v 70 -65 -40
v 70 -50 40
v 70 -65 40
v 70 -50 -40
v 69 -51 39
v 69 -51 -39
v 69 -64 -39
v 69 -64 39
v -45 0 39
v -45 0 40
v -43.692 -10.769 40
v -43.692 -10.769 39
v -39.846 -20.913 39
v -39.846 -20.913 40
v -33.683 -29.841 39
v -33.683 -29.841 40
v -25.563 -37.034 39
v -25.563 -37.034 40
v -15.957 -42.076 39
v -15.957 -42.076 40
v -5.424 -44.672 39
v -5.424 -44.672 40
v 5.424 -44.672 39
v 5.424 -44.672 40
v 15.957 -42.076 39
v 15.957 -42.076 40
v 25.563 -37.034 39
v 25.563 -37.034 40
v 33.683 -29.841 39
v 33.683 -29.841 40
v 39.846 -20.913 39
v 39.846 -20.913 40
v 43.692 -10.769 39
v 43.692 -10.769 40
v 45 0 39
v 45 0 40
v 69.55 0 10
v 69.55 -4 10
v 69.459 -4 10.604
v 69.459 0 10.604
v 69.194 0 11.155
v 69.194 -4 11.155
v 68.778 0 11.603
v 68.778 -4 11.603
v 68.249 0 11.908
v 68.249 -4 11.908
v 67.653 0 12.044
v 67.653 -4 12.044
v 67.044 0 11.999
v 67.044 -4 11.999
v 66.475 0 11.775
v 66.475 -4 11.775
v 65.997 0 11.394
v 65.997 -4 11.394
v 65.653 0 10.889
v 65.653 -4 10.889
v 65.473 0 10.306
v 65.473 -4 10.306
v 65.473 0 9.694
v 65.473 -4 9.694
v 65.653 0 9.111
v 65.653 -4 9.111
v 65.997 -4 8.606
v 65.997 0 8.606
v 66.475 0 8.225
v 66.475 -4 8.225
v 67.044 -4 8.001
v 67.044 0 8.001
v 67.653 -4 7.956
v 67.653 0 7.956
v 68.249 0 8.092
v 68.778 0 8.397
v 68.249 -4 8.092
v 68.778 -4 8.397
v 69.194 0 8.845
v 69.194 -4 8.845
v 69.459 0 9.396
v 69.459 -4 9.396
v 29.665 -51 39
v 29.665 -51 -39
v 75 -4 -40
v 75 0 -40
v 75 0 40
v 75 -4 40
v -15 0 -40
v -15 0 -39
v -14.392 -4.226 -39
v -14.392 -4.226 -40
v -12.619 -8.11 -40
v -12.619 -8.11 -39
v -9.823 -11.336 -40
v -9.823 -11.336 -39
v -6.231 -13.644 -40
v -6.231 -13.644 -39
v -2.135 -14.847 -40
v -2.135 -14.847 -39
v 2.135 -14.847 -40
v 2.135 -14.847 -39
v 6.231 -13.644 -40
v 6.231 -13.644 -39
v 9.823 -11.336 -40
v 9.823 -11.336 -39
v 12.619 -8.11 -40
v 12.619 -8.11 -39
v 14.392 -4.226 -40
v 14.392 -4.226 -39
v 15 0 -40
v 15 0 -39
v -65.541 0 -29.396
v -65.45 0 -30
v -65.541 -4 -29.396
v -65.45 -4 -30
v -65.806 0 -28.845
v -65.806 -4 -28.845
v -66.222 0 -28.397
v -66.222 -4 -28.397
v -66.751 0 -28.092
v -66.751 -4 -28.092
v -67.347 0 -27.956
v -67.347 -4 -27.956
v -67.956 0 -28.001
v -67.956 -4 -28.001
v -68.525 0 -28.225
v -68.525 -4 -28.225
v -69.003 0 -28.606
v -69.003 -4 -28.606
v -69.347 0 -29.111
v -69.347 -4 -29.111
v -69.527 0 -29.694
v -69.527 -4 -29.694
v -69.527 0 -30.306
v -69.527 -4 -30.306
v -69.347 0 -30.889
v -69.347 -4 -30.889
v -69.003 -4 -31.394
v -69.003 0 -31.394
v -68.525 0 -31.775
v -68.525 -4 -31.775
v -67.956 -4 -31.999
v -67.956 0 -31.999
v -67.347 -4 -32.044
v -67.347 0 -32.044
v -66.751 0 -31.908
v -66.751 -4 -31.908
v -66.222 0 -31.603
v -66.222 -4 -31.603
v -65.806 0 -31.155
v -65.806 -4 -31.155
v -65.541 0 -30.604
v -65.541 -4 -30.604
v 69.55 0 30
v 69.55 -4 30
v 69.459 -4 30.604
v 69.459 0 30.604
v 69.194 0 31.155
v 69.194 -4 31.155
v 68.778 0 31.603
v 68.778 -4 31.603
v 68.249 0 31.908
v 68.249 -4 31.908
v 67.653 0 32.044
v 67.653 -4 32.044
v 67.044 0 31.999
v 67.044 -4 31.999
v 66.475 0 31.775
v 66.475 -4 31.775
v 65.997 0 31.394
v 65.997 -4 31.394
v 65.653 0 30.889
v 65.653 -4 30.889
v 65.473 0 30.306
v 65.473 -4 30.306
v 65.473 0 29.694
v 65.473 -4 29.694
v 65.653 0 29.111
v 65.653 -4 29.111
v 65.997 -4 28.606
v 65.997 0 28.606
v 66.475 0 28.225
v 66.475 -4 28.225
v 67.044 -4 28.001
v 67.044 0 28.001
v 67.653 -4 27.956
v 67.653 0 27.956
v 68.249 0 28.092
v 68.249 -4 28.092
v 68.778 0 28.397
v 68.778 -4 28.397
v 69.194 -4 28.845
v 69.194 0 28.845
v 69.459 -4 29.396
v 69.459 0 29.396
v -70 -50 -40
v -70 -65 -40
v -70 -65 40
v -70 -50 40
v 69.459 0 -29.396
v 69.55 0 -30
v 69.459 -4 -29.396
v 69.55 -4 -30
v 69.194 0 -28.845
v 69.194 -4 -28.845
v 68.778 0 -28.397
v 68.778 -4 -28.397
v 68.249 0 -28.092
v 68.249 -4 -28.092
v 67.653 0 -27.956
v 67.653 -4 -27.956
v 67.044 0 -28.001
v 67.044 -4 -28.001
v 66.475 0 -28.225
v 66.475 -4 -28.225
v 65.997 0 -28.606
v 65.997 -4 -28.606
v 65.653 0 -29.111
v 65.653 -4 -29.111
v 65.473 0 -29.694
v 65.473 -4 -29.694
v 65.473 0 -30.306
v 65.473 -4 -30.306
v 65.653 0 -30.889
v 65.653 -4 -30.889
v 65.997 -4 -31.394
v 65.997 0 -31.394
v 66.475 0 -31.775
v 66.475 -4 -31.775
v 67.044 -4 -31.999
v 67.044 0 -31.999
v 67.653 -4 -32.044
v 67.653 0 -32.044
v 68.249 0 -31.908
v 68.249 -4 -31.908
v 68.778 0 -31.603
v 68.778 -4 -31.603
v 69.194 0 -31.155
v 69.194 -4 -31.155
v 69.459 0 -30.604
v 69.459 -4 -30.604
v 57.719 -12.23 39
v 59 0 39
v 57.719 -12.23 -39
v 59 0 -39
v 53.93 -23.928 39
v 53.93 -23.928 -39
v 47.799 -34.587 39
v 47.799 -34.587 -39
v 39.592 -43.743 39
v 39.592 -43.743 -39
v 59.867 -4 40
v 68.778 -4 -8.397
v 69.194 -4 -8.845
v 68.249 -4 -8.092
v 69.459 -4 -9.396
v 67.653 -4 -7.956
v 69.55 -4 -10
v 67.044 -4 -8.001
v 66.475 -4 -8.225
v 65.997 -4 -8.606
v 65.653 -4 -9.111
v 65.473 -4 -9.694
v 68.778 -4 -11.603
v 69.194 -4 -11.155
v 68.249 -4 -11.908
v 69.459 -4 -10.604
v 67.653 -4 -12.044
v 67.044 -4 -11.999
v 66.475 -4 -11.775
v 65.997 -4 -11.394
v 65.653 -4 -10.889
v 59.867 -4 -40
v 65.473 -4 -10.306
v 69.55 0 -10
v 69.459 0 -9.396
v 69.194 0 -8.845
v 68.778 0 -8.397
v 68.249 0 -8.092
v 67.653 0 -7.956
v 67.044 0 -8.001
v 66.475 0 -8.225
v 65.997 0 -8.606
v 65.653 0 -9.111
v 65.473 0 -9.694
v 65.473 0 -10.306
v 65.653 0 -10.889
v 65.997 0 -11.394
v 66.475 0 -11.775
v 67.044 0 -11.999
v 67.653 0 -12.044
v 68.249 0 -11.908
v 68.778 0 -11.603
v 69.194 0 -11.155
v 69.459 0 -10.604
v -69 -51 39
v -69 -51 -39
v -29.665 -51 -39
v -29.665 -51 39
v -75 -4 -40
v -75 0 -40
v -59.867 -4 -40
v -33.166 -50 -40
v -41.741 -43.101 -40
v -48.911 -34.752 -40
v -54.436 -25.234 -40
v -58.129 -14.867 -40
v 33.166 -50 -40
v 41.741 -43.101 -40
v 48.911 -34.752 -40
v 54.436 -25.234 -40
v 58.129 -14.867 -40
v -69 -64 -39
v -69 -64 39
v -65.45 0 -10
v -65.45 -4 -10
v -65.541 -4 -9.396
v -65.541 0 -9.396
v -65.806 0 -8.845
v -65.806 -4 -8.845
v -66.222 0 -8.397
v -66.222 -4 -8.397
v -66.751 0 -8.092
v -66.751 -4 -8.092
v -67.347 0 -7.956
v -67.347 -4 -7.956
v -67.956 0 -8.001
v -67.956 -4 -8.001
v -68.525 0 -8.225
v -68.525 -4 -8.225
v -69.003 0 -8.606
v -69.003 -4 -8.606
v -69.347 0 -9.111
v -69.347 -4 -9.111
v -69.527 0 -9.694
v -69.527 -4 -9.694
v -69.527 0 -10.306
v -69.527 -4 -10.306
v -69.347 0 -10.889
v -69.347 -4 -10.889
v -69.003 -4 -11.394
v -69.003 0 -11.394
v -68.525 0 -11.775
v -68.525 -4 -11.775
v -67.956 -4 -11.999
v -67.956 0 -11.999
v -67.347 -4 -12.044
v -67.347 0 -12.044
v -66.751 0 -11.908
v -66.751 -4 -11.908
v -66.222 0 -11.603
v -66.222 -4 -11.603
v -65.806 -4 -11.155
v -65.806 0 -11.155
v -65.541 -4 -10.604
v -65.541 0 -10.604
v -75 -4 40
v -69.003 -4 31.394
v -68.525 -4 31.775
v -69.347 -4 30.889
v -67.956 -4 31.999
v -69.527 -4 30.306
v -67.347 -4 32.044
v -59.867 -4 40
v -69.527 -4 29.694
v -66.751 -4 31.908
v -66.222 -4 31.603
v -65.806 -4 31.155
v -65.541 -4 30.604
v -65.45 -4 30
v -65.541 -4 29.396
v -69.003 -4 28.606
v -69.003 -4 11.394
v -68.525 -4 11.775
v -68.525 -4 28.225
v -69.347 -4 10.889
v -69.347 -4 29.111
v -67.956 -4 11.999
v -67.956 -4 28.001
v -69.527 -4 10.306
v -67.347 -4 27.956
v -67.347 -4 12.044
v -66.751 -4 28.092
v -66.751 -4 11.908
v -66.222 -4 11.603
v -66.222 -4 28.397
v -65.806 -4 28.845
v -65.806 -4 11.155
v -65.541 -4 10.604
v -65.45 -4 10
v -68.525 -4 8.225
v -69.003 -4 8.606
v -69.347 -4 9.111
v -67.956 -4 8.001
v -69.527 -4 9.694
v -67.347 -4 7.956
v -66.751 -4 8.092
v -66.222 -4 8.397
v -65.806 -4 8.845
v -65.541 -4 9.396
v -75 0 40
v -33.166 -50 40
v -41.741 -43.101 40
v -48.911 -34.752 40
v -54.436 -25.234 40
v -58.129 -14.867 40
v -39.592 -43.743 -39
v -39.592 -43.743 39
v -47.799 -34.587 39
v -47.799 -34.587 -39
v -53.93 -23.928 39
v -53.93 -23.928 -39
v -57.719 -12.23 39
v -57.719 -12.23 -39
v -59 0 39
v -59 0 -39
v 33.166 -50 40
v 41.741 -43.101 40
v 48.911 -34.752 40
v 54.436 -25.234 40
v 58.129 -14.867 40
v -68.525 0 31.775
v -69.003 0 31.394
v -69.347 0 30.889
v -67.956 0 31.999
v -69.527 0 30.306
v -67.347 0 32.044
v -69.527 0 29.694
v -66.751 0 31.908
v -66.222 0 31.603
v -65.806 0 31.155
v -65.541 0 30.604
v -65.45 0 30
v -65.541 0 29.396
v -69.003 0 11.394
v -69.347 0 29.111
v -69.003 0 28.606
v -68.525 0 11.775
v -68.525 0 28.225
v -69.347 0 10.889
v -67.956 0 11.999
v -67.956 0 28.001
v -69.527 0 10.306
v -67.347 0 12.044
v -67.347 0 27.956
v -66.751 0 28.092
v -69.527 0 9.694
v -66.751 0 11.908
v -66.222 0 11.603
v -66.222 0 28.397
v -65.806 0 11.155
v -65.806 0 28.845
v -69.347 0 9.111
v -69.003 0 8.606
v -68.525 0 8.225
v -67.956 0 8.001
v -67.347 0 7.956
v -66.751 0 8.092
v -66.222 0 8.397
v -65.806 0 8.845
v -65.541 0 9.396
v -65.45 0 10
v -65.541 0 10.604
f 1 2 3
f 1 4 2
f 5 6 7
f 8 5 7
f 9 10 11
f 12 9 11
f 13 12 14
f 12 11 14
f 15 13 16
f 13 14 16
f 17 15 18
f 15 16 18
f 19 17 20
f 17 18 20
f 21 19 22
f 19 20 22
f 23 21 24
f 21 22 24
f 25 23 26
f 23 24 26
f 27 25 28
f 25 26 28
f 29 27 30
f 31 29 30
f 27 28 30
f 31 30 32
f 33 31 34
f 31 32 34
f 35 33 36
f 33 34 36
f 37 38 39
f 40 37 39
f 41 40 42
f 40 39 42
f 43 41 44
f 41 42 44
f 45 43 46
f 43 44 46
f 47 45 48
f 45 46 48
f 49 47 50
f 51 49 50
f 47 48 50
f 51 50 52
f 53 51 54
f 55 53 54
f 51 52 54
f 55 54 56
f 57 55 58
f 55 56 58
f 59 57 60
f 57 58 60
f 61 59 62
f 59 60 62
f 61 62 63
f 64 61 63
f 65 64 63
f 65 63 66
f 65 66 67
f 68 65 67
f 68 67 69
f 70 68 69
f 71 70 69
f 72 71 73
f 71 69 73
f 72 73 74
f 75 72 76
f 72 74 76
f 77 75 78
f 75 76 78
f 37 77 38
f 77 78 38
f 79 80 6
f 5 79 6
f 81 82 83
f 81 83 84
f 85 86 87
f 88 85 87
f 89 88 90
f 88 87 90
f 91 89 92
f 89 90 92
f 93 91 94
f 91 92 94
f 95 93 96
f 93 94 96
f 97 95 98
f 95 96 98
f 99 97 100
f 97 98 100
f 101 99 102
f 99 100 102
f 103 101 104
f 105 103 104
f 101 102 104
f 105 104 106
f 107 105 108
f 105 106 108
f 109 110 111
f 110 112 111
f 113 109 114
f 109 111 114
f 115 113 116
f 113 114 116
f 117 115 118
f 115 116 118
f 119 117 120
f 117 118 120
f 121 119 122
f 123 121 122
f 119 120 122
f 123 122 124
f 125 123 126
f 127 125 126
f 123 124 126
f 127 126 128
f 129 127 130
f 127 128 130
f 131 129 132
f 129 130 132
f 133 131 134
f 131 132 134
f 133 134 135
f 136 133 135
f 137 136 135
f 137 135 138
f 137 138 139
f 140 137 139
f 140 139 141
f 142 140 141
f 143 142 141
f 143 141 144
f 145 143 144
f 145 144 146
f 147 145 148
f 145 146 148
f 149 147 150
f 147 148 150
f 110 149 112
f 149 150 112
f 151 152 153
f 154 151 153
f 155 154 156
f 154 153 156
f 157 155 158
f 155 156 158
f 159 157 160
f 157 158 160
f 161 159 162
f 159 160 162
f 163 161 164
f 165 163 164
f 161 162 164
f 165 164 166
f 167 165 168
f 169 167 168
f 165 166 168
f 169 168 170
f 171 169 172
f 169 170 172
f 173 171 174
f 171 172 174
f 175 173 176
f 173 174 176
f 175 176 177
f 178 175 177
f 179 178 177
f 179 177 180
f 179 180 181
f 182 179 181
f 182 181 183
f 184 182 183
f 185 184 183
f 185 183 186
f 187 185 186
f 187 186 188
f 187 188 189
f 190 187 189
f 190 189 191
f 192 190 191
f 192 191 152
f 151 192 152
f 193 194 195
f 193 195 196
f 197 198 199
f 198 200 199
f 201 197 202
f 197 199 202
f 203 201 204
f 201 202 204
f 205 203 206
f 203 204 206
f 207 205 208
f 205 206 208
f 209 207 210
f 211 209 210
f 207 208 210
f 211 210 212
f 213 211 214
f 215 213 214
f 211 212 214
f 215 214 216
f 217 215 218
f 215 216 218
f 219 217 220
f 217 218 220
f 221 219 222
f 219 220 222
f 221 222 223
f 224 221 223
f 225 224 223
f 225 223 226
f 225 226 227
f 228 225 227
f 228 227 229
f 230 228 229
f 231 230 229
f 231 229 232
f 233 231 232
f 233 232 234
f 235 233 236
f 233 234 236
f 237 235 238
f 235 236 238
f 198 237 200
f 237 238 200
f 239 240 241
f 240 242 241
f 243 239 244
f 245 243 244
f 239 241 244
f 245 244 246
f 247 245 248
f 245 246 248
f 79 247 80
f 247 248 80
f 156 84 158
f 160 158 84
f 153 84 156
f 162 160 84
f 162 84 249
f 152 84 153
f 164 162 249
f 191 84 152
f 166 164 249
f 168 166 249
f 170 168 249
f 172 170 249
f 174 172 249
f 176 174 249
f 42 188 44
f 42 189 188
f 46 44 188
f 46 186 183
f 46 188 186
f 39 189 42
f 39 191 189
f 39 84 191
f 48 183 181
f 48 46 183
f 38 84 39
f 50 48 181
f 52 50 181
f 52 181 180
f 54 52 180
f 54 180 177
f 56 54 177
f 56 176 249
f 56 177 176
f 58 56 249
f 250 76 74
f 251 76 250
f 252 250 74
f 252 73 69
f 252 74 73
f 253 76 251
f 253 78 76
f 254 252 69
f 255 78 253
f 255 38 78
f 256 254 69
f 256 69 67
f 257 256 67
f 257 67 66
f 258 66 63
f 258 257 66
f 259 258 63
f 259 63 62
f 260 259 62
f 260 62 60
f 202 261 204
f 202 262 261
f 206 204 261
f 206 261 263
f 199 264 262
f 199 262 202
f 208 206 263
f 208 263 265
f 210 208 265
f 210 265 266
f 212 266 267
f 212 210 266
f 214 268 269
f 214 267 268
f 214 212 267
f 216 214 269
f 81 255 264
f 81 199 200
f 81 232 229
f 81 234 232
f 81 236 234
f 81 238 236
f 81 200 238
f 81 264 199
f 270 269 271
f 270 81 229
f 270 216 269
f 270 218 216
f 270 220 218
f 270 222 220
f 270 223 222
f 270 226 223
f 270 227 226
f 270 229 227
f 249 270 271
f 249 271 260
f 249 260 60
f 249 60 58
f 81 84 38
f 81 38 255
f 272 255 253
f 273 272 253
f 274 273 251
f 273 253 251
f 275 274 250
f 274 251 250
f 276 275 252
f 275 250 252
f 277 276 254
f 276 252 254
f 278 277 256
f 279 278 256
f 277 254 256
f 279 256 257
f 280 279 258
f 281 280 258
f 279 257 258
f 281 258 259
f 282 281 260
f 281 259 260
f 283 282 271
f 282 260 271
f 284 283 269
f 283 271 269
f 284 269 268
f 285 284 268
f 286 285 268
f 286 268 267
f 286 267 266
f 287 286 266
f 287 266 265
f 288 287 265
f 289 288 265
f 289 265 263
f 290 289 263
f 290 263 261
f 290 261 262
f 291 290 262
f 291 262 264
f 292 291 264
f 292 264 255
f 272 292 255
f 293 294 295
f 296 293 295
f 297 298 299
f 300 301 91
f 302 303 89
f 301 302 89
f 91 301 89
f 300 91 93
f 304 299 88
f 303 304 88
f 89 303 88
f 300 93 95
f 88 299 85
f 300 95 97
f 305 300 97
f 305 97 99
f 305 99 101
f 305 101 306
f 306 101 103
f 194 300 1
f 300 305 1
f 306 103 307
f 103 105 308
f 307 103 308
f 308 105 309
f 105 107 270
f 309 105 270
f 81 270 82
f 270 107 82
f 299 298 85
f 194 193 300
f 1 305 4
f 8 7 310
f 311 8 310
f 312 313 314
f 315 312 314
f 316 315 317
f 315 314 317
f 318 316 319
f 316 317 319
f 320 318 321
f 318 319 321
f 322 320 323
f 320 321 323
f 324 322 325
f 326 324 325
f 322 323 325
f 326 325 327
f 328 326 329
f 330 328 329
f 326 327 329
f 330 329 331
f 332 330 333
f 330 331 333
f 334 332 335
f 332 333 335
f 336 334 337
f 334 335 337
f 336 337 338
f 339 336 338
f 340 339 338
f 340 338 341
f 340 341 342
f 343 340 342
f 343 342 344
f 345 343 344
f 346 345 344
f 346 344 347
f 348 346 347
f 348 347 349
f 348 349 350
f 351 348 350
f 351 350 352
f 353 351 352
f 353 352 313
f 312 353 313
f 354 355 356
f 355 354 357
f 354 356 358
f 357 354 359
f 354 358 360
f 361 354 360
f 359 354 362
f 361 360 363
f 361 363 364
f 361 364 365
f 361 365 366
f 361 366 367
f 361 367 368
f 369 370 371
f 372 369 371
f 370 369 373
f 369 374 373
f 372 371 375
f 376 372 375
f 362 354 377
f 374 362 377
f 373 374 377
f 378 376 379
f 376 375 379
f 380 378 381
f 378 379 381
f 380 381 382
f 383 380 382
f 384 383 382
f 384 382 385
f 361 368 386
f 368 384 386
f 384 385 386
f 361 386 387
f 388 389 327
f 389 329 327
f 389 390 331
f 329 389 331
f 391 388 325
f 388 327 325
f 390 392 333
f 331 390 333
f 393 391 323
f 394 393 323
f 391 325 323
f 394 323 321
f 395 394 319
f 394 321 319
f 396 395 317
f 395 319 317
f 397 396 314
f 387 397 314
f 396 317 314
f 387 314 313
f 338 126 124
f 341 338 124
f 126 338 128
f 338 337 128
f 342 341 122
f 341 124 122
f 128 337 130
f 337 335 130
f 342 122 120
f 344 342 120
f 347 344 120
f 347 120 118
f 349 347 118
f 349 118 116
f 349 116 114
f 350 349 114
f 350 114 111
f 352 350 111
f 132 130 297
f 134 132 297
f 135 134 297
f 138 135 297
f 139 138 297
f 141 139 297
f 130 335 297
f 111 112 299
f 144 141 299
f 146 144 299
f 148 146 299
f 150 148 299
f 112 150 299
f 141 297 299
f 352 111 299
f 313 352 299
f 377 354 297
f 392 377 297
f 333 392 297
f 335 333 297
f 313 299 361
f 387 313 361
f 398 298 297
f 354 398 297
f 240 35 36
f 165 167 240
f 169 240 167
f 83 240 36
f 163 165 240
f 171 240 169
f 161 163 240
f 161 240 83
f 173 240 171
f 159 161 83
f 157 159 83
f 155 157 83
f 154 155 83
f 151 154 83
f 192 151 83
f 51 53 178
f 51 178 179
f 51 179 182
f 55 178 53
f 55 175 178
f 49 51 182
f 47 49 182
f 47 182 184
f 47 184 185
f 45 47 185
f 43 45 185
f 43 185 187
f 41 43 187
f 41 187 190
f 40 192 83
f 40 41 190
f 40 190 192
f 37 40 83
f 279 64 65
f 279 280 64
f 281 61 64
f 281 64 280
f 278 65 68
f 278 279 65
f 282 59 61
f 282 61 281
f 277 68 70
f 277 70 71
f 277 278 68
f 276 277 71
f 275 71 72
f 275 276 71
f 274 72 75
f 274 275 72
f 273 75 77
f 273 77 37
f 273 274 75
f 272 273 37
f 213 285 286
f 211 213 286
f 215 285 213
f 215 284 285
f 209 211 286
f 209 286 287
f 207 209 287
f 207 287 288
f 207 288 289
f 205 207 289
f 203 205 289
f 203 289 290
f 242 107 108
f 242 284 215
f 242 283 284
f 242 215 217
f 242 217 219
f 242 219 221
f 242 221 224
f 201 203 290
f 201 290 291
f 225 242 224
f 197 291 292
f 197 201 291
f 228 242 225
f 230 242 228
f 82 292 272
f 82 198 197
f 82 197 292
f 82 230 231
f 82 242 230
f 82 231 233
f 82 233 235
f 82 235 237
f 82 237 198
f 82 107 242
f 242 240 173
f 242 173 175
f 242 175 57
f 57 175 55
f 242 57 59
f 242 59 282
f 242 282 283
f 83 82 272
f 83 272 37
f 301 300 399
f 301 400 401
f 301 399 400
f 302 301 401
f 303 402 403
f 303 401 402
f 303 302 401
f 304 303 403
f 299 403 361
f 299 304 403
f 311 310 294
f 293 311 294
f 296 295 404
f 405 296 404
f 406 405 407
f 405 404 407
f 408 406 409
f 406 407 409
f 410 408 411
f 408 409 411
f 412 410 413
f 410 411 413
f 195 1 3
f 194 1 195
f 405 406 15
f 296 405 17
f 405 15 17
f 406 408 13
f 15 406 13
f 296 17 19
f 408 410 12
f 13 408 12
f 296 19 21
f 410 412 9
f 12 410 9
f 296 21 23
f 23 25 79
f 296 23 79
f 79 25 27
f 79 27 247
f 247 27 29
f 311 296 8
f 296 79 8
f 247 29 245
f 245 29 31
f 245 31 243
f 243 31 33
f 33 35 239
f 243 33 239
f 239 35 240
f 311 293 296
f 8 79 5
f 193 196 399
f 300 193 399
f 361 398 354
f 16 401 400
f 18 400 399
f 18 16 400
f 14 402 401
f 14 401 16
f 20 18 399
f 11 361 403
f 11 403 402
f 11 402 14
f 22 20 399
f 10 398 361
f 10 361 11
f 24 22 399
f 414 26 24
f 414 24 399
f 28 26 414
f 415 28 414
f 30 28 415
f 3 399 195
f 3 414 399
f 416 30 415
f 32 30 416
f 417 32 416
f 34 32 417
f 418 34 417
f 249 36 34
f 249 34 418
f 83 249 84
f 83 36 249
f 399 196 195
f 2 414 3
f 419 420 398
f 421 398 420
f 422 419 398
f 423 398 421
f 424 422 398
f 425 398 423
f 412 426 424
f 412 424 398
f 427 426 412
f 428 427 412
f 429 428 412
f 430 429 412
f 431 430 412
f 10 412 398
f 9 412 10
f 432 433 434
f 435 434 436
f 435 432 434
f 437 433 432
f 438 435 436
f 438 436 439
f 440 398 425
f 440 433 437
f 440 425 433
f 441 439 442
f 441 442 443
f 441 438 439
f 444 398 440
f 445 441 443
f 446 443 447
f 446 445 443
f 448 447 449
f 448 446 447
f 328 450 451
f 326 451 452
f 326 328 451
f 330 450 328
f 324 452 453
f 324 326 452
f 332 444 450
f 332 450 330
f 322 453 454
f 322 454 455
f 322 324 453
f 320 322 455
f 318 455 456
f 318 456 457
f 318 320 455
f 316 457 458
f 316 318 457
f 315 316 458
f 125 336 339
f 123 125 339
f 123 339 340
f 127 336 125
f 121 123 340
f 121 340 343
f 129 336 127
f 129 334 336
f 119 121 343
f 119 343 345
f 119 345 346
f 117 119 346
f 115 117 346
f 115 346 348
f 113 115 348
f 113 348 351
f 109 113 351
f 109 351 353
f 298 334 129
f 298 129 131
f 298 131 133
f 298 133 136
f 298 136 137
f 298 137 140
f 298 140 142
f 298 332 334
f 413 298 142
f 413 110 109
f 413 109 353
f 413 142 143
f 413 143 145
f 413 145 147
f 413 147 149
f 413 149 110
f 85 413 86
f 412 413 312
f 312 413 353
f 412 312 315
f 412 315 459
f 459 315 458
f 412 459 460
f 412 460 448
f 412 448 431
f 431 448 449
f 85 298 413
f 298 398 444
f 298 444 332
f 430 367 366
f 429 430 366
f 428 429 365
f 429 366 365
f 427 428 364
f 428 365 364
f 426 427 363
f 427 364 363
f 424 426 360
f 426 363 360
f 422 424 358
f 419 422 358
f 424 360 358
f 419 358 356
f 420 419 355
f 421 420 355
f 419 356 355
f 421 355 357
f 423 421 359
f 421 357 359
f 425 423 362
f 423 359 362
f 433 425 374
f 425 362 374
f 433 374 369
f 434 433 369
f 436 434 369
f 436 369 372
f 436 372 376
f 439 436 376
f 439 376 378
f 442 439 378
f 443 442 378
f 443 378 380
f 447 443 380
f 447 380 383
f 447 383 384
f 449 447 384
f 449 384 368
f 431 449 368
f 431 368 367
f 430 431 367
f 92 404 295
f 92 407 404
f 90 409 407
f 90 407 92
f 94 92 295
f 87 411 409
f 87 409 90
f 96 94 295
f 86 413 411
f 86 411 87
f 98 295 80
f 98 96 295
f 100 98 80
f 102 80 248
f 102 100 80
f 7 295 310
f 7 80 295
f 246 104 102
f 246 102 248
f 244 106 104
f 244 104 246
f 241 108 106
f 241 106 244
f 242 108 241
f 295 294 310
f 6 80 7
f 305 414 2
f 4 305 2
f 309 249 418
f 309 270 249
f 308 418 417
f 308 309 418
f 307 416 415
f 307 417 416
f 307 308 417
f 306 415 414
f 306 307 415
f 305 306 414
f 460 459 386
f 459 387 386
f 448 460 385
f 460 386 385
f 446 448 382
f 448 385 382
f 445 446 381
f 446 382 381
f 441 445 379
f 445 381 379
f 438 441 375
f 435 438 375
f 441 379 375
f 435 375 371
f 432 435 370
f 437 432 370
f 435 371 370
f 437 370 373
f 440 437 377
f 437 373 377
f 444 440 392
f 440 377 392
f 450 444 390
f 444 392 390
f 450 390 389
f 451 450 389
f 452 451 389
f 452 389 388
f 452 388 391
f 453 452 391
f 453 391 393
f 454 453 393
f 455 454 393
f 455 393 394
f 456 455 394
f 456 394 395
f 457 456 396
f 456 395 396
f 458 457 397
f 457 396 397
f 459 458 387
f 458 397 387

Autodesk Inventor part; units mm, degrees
ref_plane "YZ Plane" through (0, 0, 0) normal (1, 0, 0) x (0, 1, 0)
ref_plane "XZ Plane" through (0, 0, 0) normal (0, 1, 0) x (-1, 0, 0)
ref_plane "XY Plane" through (0, 0, 0) normal (0, 0, 1) x (1, 0, 0)
sketch "Sketch1" plane through (0, 0, 0) normal (0, 0, 1) x (1, 0, 0)
  line L0 (-60, 0) -> (60, 0)
  line L1 (70, -50) -> (70, -65)
  line L2 (70, -65) -> (-70, -65)
  line L3 (-70, -65) -> (-70, -50)
  line L4 (-70, -50) -> (70, -65) construction
  line L5 (-70, -50) -> (-33.1662, -50)
  line L6 (33.1662, -50) -> (70, -50)
  arc A0 (-60, 0) -> (-33.1662, -50) centre (0, 0) ccw
  arc A1 (33.1662, -50) -> (60, 0) centre (0, 0) ccw
  line L7 (70, -50) -> (24.1881, -54.9084) construction
  line L8 (0, -57.5) -> (-70, -65) construction
  dimension "d1" = 15
  dimension "d2" = 140
  dimension "d3" = 0
  dimension "d4" = 65
extrude "Extrusion1" add sketch "Sketch1" along normal mid plane 80
shell "Shell1" thickness 1 removed faces 1 at (-20, 0, 13.3333)
sketch "Sketch2" plane through (0, 0, 40) normal (0, 0, 1) x (1, 0, 0)
  circle A0 centre (0, 0) radius 45
  dimension "d8" = 90
extrude "Extrusion2" cut sketch "Sketch2" against normal blind 2
sketch "Sketch3" plane through (-69, -64, -39) normal (0, 0, 1) x (1, 0, 0)
  circle A0 centre (69, 64) radius 15
  dimension "d11" = 30
extrude "Extrusion3" cut sketch "Sketch3" against normal blind 2
sketch "Sketch4" plane through (0, 0, 0) normal (0, 0, 1) x (1, 0, 0)
  line L0 (60, 0) -> (45, 0) projected
  line L1 (59.4, 0) -> (75, 0)
  line L2 (75, 0) -> (75, -4)
  line L3 (75, -4) -> (59.4, -4)
  line L4 (59.4, -4) -> (59.4, 0)
  line L5 (-70, -65) -> (70, -65) projected
  line L6 (0, 14.3485) -> (0, -121.7011) construction
  line L7 (-60, 0) -> (-45, 0)
  line L8 (-59.4, 0) -> (-75, 0)
  line L9 (-75, 0) -> (-75, -4)
  line L10 (-75, -4) -> (-59.4, -4)
  line L11 (-59.4, -4) -> (-59.4, 0)
  point P0 (0, 0)
  dimension "d14" = 65
  dimension "d15" = 4
  dimension "d16" = 15.6
  dimension "d17" = 75
extrude "Extrusion4" add sketch "Sketch4" along normal mid plane 80
sketch "Sketch5" plane through (59.8665, -4, -40) normal (0, -1, 0) x (1, 0, 0)
  circle A0 centre (7.6335, 10) radius 2.05
  line L0 (15.1335, 0) -> (0, 0) projected
  line L1 (15.1335, 80) -> (15.1335, 0) projected
  circle A1 centre (7.6335, 30) radius 2.05
  circle A2 centre (7.6335, 50) radius 2.05
  circle A3 centre (7.6335, 70) radius 2.05
  circle A4 centre (-127.3665, 10) radius 2.05
  circle A5 centre (-127.3665, 30) radius 2.05
  circle A6 centre (-127.3665, 50) radius 2.05
  circle A7 centre (-127.3665, 70) radius 2.05
  point P0 (-59.8665, 40)
  point P1 (15.1335, 20)
  point P2 (15.1335, 40)
  point P3 (15.1335, 60)
  point P4 (-119.8665, 0)
  point P5 (-119.8665, 20)
  point P6 (-119.8665, 40)
  point P7 (-119.8665, 60)
  dimension "d20" = 4.1
  dimension "d21" = 10
  dimension "d22" = 7.5
  dimension "d25" = 20
  dimension "d28" = 135
extrude "Extrusion5" cut sketch "Sketch5" against normal blind 80
properties part number "Carcaça Inferior do Motor Industiral" material "Aluminum 6061"
